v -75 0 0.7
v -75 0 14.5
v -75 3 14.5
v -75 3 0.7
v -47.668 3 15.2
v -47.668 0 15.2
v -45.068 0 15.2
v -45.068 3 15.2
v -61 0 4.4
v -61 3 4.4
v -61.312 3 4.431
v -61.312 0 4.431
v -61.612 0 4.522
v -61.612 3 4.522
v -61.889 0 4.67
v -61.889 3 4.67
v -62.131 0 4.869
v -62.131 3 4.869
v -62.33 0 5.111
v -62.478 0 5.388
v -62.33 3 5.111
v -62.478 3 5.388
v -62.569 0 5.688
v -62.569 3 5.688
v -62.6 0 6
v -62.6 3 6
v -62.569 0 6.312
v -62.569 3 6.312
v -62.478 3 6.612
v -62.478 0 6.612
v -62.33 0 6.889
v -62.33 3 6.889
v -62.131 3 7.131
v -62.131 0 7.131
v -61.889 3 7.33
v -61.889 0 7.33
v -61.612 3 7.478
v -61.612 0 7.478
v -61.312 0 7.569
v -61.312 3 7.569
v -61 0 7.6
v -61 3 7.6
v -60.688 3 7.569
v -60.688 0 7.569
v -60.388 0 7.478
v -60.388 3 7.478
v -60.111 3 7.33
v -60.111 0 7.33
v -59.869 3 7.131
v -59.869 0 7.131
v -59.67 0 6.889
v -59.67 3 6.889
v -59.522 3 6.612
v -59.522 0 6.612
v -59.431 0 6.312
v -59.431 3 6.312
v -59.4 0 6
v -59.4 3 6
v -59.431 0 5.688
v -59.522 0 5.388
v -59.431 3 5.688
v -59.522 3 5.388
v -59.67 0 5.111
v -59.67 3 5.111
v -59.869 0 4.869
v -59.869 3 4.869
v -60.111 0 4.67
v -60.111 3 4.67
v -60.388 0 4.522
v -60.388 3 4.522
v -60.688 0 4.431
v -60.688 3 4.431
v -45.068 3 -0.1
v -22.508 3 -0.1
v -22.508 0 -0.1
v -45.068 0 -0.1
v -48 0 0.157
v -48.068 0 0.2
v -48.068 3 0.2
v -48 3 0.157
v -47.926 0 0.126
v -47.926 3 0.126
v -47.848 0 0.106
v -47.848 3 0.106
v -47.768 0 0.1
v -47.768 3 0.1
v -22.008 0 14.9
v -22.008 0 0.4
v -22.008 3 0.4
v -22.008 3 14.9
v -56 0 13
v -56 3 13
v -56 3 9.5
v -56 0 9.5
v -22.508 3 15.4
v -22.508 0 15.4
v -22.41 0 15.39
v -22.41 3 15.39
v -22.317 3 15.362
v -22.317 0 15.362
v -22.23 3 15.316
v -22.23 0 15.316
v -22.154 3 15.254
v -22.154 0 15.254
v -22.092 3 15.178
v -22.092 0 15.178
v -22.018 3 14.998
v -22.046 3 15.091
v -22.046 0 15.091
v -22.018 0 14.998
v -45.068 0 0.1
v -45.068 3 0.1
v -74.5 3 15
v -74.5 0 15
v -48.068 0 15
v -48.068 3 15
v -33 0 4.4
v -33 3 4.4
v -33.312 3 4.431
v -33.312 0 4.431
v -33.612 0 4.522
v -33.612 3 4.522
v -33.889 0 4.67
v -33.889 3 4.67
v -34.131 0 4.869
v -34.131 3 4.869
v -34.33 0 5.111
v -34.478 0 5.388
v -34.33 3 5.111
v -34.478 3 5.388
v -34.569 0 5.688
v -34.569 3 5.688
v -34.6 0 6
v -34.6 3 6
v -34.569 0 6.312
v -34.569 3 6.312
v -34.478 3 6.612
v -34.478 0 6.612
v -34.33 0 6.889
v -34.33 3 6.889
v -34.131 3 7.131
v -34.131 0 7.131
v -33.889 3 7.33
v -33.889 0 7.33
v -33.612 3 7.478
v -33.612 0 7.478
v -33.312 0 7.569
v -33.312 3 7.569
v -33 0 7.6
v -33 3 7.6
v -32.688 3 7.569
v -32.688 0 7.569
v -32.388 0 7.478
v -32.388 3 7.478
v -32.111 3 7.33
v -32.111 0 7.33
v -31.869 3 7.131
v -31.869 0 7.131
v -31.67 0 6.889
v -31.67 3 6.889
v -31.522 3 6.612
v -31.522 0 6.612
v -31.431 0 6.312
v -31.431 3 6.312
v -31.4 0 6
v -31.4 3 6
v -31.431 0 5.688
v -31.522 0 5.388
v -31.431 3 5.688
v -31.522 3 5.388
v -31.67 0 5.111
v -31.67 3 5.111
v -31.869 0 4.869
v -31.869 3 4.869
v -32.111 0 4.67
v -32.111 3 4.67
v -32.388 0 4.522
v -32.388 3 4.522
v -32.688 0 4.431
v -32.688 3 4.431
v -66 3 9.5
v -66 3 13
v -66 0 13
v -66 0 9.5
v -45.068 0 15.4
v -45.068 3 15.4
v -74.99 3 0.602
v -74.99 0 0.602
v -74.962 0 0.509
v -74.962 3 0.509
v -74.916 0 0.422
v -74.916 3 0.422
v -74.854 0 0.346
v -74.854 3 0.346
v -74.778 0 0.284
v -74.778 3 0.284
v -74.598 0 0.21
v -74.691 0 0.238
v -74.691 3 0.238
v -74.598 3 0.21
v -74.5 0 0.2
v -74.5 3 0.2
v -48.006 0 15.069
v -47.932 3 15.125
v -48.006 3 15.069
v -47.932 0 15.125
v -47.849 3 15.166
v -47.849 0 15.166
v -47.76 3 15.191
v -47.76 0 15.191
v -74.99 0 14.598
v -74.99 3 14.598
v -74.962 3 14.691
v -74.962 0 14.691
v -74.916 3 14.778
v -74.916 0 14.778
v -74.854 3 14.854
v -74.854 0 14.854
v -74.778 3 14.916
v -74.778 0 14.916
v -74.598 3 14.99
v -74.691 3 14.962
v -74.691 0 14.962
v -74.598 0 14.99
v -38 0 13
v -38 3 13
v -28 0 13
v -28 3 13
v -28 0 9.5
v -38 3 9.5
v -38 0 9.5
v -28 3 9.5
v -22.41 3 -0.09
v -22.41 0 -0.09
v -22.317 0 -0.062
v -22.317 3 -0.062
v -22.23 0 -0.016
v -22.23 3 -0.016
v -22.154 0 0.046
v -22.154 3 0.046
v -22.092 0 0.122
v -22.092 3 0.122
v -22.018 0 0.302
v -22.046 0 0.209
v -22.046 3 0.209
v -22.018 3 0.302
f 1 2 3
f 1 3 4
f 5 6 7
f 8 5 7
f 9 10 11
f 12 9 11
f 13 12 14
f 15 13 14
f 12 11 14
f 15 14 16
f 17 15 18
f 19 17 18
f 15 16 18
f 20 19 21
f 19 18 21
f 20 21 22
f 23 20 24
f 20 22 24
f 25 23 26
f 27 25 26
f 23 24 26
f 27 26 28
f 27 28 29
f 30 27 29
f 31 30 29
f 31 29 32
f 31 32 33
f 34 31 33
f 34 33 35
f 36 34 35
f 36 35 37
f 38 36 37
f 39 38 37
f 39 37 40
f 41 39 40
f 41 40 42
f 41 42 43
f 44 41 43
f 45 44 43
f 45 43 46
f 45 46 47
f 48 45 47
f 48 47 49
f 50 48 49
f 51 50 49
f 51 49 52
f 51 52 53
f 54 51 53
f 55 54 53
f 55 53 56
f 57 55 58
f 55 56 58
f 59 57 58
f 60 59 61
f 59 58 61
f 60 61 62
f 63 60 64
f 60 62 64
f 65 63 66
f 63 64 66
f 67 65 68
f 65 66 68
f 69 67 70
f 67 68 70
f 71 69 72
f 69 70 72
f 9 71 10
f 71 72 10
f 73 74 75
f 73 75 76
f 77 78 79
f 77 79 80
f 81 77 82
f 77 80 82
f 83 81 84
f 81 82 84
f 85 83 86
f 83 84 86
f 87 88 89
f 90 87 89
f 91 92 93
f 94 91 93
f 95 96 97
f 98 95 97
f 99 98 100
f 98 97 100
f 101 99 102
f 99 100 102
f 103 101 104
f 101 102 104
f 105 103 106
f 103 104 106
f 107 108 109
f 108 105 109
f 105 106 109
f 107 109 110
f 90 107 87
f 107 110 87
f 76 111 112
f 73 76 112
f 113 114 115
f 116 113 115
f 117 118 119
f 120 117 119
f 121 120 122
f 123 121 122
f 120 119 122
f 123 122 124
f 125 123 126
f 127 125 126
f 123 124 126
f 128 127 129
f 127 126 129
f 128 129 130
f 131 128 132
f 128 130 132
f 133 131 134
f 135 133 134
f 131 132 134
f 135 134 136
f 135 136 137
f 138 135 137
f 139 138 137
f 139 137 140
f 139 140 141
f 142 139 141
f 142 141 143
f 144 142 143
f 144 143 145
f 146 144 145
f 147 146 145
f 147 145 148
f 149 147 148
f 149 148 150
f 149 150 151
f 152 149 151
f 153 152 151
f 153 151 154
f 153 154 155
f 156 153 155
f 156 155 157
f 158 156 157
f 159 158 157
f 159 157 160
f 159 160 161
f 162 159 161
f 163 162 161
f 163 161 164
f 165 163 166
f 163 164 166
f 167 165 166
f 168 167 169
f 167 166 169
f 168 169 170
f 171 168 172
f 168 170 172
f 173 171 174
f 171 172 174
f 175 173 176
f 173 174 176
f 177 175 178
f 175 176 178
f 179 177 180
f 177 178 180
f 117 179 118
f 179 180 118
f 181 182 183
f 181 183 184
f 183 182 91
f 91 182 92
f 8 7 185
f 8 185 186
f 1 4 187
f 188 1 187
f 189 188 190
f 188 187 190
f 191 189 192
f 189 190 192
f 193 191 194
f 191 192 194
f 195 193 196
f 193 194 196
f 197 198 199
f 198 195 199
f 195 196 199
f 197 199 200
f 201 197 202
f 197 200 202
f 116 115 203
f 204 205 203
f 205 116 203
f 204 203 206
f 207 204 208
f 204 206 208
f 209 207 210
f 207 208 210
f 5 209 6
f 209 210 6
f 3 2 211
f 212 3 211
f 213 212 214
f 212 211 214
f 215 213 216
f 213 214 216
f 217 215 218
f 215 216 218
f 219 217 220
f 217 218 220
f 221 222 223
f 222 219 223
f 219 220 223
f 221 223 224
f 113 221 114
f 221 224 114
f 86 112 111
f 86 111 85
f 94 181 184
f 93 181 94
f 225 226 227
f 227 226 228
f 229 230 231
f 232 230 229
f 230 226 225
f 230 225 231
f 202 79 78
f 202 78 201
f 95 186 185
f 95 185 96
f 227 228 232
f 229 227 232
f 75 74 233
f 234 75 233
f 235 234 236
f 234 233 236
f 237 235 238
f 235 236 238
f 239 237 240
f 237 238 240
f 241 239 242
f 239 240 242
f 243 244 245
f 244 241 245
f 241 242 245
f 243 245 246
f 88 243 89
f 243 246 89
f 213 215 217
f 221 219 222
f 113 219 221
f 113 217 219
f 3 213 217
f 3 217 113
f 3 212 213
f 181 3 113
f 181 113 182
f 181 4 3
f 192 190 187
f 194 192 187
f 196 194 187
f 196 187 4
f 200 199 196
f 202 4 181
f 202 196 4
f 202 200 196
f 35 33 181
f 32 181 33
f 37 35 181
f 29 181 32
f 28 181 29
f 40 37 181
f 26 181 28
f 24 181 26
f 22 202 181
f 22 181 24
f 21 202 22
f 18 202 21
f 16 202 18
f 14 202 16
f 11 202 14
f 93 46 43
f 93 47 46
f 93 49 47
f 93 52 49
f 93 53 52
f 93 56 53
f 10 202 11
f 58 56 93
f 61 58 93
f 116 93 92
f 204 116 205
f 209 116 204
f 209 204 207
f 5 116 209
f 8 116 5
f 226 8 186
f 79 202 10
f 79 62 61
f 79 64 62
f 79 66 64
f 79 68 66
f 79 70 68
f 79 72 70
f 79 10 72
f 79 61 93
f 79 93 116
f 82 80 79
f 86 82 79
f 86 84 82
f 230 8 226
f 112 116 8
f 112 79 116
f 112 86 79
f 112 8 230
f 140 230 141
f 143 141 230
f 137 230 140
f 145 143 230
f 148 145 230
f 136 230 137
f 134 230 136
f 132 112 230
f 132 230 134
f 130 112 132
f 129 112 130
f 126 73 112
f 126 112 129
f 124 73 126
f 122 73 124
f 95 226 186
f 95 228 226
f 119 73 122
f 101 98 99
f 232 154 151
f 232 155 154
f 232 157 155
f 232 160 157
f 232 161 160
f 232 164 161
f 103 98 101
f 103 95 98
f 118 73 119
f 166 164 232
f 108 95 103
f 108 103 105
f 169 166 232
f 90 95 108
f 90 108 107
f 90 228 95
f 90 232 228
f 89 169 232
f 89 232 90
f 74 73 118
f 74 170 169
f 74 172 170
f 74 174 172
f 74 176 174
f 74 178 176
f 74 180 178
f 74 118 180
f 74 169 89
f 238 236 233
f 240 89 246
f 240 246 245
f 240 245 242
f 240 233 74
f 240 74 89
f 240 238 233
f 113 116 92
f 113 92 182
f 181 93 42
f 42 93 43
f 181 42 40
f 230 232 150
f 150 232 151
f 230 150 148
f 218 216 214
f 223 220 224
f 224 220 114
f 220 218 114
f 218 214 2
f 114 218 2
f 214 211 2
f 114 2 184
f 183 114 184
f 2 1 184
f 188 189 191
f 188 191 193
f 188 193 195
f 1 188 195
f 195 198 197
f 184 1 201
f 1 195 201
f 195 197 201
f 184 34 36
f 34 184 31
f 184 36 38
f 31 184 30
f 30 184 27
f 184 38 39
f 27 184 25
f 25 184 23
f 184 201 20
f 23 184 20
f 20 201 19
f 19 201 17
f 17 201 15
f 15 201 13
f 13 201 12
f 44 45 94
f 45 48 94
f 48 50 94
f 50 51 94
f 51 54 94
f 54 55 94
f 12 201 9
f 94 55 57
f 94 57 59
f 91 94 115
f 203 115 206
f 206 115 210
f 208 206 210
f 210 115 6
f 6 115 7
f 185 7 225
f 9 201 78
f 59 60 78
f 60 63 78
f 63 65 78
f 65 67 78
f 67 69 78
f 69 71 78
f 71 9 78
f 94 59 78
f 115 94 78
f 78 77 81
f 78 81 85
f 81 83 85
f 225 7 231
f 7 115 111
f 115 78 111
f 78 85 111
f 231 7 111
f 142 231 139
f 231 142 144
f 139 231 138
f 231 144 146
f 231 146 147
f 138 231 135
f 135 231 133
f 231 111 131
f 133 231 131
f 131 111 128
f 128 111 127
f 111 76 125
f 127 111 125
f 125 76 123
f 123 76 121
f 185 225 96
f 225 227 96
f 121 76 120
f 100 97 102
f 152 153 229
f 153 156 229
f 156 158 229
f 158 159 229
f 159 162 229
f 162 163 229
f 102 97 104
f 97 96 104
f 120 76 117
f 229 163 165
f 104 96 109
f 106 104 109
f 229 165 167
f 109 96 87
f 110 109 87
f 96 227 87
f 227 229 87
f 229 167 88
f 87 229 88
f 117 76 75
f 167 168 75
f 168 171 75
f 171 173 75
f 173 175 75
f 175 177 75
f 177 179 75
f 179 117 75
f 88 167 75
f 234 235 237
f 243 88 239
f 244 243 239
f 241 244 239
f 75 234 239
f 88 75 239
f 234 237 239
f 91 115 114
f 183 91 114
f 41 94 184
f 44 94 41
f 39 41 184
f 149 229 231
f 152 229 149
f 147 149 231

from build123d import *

# Parameters (mm, degrees)
CROQUIS1_W              = 150
CROQUIS1_H              = 30
SALIENTE_EXTRUIR1_DEPTH = 3
CROQUIS2_R              = 1.6
CROQUIS2_W              = 10
CROQUIS2_H              = 3.5
CORTAR_EXTRUIR1_DEPTH   = 77.544104933
CORTAR_EXTRUIR2_START   = -10
CROQUIS3_R              = 1.6
CROQUIS3_W              = 10
CROQUIS3_H              = 3.5
CORTAR_EXTRUIR2_DEPTH   = 10
CROQUIS4_W              = 26.059818974
CROQUIS4_H              = 3
SALIENTE_EXTRUIR2_DEPTH = 0.2
CROQUIS6_W              = 23.059818974
CROQUIS6_H              = 3
SALIENTE_EXTRUIR4_DEPTH = 0.2
CROQUIS7_W              = 23.059818974
CROQUIS7_H              = 3
SALIENTE_EXTRUIR5_DEPTH = 0.2
REDONDEO1_R             = 0.5


with BuildPart() as part:
    # Croquis1 → Saliente-Extruir1 (new body)
    with BuildSketch(Plane(origin=(0, 0, 0), x_dir=(1, 0, 0), z_dir=(0, 1, 0))):
        Rectangle(CROQUIS1_W, CROQUIS1_H)
    extrude(amount=SALIENTE_EXTRUIR1_DEPTH)

    # Croquis2 → Cortar-Extruir1 (cut, through all)
    with BuildSketch(Plane(origin=(0, 3, 0), x_dir=(1, 0, 0), z_dir=(0, 1, 0))):
        with Locations(Location((61, -6, 0), (0, 0, 270))):
            Circle(CROQUIS2_R)
        with Locations(Location((33, -6, 0), (0, 0, 270))):
            Circle(CROQUIS2_R)
        with Locations(Location((-33, -6, 0), (0, 0, 90))):
            Circle(CROQUIS2_R)
        with Locations(Location((-61, -6, 0), (0, 0, 90))):
            Circle(CROQUIS2_R)
        with Locations((61, -11.25)):
            Rectangle(CROQUIS2_W, CROQUIS2_H)
        with Locations((33, -11.25)):
            Rectangle(CROQUIS2_W, CROQUIS2_H)
        with Locations((-33, -11.25)):
            Rectangle(CROQUIS2_W, CROQUIS2_H)
        with Locations((-61, -11.25)):
            Rectangle(CROQUIS2_W, CROQUIS2_H)
    extrude(amount=-CORTAR_EXTRUIR1_DEPTH, mode=Mode.SUBTRACT)

    # Croquis3 → Cortar-Extruir2 (cut)
    with BuildSketch(Plane.XZ.offset(CORTAR_EXTRUIR2_START)):
        Polygon((-48.06783131, 0.2), (-75, 0.2), (-75, -15), (75, -15), (75, 15), (-22.008012336, 15), (-22.008012336, 0.1), (-48.06783131, 0.1), align=None)
        with Locations((33, 6)):
            Circle(CROQUIS3_R, mode=Mode.SUBTRACT)
        with Locations((61, 6)):
            Circle(CROQUIS3_R, mode=Mode.SUBTRACT)
        with Locations((33, 11.25)):
            Rectangle(CROQUIS3_W, CROQUIS3_H, mode=Mode.SUBTRACT)
        with Locations((61, 11.25)):
            Rectangle(CROQUIS3_W, CROQUIS3_H, mode=Mode.SUBTRACT)
    extrude(amount=CORTAR_EXTRUIR2_DEPTH, mode=Mode.SUBTRACT)

    # Croquis4 → Saliente-Extruir2 (add)
    with BuildSketch(Plane.XY.offset(15)):
        with Locations((-35.037921823, 1.5)):
            Rectangle(CROQUIS4_W, CROQUIS4_H)
    extrude(amount=SALIENTE_EXTRUIR2_DEPTH)

    # Croquis6 → Saliente-Extruir4 (add)
    with BuildSketch(Plane(origin=(0, 0, 0.1), x_dir=(-1, 0, 0), z_dir=(0, 0, -1))):
        with Locations((33.537921823, 1.5)):
            Rectangle(CROQUIS6_W, CROQUIS6_H)
    extrude(amount=SALIENTE_EXTRUIR4_DEPTH)

    # Croquis7 → Saliente-Extruir5 (add)
    with BuildSketch(Plane.XY.offset(15.2)):
        with Locations((-33.537921823, 1.5)):
            Rectangle(CROQUIS7_W, CROQUIS7_H)
    extrude(amount=SALIENTE_EXTRUIR5_DEPTH)

    # Redondeo1
    # the kernel refuses this fillet: 0.5 mm, written as the material it takes off along each edge
    with BuildSketch(Plane(origin=(-48.06783131, 3.75, 0.1), x_dir=(0, 0, 1), z_dir=(0, -1, 0))) as redondeo1_piece_1:
        with BuildLine():
            CenterArc((0.5, -0.3), REDONDEO1_R, 143.130102354, 36.869897646)
            Line((0, -0.3), (-0.01, -0.3))
            Line((-0.01, -0.3), (-0.01, 0))
            Line((-0.01, 0), (0, 0.01))
            ThreePointArc((0, 0.01), (0.05, 0.01), (0.092, 0.006))
            Line((0.092, 0.006), (0.1, 0))
        make_face()
    extrude(amount=4.5, mode=Mode.SUBTRACT)
    with BuildSketch(Plane(origin=(-48.06783131, -1, 15.2), x_dir=(1, 0, 0), z_dir=(0, 1, 0))) as redondeo1_piece_2:
        with BuildLine():
            CenterArc((0.4, 0.5), REDONDEO1_R, 216.869897645, 53.130102355)
            Line((0, 0.2), (-0.008, 0.194))
            ThreePointArc((-0.008, 0.194), (-0.01, 0.1), (-0.01, 0))
            Line((-0.01, 0), (0, -0.01))
            Line((0, -0.01), (0.4, -0.01))
            Line((0.4, -0.01), (0.4, 0))
        make_face()
    extrude(amount=5, mode=Mode.SUBTRACT)
    with BuildSketch(Plane(origin=(-22.008012336, -1.25, 15.4), x_dir=(0, 0, -1), z_dir=(0, 1, 0)), Plane(origin=(-75, -1.25, 15), x_dir=(1, 0, 0), z_dir=(0, 1, 0))) as redondeo1_piece_3:
        with BuildLine():
            CenterArc((REDONDEO1_R, REDONDEO1_R), REDONDEO1_R, 180, 90)
            Line((0, REDONDEO1_R), (-REDONDEO1_R * 0.02, REDONDEO1_R))
            Line((-REDONDEO1_R * 0.02, REDONDEO1_R), (-REDONDEO1_R * 0.02, -REDONDEO1_R * 0.02))
            Line((-REDONDEO1_R * 0.02, -REDONDEO1_R * 0.02), (REDONDEO1_R, -REDONDEO1_R * 0.02))
            Line((REDONDEO1_R, -REDONDEO1_R * 0.02), (REDONDEO1_R, 0))
        make_face()
    extrude(amount=5.5, mode=Mode.SUBTRACT)
    with BuildSketch(Plane(origin=(-22.008012336, 4.25, -0.1), x_dir=(-1, 0, 0), z_dir=(0, -1, 0)), Plane(origin=(-75, 4.25, 0.2), x_dir=(0, 0, 1), z_dir=(0, -1, 0))) as redondeo1_piece_4:
        with BuildLine():
            CenterArc((REDONDEO1_R, -REDONDEO1_R), REDONDEO1_R, 90, 90)
            Line((0, -REDONDEO1_R), (-REDONDEO1_R * 0.02, -REDONDEO1_R))
            Line((-REDONDEO1_R * 0.02, -REDONDEO1_R), (-REDONDEO1_R * 0.02, REDONDEO1_R * 0.02))
            Line((-REDONDEO1_R * 0.02, REDONDEO1_R * 0.02), (REDONDEO1_R, REDONDEO1_R * 0.02))
            Line((REDONDEO1_R, REDONDEO1_R * 0.02), (REDONDEO1_R, 0))
        make_face()
    extrude(amount=5.5, mode=Mode.SUBTRACT)


solid = part.part
